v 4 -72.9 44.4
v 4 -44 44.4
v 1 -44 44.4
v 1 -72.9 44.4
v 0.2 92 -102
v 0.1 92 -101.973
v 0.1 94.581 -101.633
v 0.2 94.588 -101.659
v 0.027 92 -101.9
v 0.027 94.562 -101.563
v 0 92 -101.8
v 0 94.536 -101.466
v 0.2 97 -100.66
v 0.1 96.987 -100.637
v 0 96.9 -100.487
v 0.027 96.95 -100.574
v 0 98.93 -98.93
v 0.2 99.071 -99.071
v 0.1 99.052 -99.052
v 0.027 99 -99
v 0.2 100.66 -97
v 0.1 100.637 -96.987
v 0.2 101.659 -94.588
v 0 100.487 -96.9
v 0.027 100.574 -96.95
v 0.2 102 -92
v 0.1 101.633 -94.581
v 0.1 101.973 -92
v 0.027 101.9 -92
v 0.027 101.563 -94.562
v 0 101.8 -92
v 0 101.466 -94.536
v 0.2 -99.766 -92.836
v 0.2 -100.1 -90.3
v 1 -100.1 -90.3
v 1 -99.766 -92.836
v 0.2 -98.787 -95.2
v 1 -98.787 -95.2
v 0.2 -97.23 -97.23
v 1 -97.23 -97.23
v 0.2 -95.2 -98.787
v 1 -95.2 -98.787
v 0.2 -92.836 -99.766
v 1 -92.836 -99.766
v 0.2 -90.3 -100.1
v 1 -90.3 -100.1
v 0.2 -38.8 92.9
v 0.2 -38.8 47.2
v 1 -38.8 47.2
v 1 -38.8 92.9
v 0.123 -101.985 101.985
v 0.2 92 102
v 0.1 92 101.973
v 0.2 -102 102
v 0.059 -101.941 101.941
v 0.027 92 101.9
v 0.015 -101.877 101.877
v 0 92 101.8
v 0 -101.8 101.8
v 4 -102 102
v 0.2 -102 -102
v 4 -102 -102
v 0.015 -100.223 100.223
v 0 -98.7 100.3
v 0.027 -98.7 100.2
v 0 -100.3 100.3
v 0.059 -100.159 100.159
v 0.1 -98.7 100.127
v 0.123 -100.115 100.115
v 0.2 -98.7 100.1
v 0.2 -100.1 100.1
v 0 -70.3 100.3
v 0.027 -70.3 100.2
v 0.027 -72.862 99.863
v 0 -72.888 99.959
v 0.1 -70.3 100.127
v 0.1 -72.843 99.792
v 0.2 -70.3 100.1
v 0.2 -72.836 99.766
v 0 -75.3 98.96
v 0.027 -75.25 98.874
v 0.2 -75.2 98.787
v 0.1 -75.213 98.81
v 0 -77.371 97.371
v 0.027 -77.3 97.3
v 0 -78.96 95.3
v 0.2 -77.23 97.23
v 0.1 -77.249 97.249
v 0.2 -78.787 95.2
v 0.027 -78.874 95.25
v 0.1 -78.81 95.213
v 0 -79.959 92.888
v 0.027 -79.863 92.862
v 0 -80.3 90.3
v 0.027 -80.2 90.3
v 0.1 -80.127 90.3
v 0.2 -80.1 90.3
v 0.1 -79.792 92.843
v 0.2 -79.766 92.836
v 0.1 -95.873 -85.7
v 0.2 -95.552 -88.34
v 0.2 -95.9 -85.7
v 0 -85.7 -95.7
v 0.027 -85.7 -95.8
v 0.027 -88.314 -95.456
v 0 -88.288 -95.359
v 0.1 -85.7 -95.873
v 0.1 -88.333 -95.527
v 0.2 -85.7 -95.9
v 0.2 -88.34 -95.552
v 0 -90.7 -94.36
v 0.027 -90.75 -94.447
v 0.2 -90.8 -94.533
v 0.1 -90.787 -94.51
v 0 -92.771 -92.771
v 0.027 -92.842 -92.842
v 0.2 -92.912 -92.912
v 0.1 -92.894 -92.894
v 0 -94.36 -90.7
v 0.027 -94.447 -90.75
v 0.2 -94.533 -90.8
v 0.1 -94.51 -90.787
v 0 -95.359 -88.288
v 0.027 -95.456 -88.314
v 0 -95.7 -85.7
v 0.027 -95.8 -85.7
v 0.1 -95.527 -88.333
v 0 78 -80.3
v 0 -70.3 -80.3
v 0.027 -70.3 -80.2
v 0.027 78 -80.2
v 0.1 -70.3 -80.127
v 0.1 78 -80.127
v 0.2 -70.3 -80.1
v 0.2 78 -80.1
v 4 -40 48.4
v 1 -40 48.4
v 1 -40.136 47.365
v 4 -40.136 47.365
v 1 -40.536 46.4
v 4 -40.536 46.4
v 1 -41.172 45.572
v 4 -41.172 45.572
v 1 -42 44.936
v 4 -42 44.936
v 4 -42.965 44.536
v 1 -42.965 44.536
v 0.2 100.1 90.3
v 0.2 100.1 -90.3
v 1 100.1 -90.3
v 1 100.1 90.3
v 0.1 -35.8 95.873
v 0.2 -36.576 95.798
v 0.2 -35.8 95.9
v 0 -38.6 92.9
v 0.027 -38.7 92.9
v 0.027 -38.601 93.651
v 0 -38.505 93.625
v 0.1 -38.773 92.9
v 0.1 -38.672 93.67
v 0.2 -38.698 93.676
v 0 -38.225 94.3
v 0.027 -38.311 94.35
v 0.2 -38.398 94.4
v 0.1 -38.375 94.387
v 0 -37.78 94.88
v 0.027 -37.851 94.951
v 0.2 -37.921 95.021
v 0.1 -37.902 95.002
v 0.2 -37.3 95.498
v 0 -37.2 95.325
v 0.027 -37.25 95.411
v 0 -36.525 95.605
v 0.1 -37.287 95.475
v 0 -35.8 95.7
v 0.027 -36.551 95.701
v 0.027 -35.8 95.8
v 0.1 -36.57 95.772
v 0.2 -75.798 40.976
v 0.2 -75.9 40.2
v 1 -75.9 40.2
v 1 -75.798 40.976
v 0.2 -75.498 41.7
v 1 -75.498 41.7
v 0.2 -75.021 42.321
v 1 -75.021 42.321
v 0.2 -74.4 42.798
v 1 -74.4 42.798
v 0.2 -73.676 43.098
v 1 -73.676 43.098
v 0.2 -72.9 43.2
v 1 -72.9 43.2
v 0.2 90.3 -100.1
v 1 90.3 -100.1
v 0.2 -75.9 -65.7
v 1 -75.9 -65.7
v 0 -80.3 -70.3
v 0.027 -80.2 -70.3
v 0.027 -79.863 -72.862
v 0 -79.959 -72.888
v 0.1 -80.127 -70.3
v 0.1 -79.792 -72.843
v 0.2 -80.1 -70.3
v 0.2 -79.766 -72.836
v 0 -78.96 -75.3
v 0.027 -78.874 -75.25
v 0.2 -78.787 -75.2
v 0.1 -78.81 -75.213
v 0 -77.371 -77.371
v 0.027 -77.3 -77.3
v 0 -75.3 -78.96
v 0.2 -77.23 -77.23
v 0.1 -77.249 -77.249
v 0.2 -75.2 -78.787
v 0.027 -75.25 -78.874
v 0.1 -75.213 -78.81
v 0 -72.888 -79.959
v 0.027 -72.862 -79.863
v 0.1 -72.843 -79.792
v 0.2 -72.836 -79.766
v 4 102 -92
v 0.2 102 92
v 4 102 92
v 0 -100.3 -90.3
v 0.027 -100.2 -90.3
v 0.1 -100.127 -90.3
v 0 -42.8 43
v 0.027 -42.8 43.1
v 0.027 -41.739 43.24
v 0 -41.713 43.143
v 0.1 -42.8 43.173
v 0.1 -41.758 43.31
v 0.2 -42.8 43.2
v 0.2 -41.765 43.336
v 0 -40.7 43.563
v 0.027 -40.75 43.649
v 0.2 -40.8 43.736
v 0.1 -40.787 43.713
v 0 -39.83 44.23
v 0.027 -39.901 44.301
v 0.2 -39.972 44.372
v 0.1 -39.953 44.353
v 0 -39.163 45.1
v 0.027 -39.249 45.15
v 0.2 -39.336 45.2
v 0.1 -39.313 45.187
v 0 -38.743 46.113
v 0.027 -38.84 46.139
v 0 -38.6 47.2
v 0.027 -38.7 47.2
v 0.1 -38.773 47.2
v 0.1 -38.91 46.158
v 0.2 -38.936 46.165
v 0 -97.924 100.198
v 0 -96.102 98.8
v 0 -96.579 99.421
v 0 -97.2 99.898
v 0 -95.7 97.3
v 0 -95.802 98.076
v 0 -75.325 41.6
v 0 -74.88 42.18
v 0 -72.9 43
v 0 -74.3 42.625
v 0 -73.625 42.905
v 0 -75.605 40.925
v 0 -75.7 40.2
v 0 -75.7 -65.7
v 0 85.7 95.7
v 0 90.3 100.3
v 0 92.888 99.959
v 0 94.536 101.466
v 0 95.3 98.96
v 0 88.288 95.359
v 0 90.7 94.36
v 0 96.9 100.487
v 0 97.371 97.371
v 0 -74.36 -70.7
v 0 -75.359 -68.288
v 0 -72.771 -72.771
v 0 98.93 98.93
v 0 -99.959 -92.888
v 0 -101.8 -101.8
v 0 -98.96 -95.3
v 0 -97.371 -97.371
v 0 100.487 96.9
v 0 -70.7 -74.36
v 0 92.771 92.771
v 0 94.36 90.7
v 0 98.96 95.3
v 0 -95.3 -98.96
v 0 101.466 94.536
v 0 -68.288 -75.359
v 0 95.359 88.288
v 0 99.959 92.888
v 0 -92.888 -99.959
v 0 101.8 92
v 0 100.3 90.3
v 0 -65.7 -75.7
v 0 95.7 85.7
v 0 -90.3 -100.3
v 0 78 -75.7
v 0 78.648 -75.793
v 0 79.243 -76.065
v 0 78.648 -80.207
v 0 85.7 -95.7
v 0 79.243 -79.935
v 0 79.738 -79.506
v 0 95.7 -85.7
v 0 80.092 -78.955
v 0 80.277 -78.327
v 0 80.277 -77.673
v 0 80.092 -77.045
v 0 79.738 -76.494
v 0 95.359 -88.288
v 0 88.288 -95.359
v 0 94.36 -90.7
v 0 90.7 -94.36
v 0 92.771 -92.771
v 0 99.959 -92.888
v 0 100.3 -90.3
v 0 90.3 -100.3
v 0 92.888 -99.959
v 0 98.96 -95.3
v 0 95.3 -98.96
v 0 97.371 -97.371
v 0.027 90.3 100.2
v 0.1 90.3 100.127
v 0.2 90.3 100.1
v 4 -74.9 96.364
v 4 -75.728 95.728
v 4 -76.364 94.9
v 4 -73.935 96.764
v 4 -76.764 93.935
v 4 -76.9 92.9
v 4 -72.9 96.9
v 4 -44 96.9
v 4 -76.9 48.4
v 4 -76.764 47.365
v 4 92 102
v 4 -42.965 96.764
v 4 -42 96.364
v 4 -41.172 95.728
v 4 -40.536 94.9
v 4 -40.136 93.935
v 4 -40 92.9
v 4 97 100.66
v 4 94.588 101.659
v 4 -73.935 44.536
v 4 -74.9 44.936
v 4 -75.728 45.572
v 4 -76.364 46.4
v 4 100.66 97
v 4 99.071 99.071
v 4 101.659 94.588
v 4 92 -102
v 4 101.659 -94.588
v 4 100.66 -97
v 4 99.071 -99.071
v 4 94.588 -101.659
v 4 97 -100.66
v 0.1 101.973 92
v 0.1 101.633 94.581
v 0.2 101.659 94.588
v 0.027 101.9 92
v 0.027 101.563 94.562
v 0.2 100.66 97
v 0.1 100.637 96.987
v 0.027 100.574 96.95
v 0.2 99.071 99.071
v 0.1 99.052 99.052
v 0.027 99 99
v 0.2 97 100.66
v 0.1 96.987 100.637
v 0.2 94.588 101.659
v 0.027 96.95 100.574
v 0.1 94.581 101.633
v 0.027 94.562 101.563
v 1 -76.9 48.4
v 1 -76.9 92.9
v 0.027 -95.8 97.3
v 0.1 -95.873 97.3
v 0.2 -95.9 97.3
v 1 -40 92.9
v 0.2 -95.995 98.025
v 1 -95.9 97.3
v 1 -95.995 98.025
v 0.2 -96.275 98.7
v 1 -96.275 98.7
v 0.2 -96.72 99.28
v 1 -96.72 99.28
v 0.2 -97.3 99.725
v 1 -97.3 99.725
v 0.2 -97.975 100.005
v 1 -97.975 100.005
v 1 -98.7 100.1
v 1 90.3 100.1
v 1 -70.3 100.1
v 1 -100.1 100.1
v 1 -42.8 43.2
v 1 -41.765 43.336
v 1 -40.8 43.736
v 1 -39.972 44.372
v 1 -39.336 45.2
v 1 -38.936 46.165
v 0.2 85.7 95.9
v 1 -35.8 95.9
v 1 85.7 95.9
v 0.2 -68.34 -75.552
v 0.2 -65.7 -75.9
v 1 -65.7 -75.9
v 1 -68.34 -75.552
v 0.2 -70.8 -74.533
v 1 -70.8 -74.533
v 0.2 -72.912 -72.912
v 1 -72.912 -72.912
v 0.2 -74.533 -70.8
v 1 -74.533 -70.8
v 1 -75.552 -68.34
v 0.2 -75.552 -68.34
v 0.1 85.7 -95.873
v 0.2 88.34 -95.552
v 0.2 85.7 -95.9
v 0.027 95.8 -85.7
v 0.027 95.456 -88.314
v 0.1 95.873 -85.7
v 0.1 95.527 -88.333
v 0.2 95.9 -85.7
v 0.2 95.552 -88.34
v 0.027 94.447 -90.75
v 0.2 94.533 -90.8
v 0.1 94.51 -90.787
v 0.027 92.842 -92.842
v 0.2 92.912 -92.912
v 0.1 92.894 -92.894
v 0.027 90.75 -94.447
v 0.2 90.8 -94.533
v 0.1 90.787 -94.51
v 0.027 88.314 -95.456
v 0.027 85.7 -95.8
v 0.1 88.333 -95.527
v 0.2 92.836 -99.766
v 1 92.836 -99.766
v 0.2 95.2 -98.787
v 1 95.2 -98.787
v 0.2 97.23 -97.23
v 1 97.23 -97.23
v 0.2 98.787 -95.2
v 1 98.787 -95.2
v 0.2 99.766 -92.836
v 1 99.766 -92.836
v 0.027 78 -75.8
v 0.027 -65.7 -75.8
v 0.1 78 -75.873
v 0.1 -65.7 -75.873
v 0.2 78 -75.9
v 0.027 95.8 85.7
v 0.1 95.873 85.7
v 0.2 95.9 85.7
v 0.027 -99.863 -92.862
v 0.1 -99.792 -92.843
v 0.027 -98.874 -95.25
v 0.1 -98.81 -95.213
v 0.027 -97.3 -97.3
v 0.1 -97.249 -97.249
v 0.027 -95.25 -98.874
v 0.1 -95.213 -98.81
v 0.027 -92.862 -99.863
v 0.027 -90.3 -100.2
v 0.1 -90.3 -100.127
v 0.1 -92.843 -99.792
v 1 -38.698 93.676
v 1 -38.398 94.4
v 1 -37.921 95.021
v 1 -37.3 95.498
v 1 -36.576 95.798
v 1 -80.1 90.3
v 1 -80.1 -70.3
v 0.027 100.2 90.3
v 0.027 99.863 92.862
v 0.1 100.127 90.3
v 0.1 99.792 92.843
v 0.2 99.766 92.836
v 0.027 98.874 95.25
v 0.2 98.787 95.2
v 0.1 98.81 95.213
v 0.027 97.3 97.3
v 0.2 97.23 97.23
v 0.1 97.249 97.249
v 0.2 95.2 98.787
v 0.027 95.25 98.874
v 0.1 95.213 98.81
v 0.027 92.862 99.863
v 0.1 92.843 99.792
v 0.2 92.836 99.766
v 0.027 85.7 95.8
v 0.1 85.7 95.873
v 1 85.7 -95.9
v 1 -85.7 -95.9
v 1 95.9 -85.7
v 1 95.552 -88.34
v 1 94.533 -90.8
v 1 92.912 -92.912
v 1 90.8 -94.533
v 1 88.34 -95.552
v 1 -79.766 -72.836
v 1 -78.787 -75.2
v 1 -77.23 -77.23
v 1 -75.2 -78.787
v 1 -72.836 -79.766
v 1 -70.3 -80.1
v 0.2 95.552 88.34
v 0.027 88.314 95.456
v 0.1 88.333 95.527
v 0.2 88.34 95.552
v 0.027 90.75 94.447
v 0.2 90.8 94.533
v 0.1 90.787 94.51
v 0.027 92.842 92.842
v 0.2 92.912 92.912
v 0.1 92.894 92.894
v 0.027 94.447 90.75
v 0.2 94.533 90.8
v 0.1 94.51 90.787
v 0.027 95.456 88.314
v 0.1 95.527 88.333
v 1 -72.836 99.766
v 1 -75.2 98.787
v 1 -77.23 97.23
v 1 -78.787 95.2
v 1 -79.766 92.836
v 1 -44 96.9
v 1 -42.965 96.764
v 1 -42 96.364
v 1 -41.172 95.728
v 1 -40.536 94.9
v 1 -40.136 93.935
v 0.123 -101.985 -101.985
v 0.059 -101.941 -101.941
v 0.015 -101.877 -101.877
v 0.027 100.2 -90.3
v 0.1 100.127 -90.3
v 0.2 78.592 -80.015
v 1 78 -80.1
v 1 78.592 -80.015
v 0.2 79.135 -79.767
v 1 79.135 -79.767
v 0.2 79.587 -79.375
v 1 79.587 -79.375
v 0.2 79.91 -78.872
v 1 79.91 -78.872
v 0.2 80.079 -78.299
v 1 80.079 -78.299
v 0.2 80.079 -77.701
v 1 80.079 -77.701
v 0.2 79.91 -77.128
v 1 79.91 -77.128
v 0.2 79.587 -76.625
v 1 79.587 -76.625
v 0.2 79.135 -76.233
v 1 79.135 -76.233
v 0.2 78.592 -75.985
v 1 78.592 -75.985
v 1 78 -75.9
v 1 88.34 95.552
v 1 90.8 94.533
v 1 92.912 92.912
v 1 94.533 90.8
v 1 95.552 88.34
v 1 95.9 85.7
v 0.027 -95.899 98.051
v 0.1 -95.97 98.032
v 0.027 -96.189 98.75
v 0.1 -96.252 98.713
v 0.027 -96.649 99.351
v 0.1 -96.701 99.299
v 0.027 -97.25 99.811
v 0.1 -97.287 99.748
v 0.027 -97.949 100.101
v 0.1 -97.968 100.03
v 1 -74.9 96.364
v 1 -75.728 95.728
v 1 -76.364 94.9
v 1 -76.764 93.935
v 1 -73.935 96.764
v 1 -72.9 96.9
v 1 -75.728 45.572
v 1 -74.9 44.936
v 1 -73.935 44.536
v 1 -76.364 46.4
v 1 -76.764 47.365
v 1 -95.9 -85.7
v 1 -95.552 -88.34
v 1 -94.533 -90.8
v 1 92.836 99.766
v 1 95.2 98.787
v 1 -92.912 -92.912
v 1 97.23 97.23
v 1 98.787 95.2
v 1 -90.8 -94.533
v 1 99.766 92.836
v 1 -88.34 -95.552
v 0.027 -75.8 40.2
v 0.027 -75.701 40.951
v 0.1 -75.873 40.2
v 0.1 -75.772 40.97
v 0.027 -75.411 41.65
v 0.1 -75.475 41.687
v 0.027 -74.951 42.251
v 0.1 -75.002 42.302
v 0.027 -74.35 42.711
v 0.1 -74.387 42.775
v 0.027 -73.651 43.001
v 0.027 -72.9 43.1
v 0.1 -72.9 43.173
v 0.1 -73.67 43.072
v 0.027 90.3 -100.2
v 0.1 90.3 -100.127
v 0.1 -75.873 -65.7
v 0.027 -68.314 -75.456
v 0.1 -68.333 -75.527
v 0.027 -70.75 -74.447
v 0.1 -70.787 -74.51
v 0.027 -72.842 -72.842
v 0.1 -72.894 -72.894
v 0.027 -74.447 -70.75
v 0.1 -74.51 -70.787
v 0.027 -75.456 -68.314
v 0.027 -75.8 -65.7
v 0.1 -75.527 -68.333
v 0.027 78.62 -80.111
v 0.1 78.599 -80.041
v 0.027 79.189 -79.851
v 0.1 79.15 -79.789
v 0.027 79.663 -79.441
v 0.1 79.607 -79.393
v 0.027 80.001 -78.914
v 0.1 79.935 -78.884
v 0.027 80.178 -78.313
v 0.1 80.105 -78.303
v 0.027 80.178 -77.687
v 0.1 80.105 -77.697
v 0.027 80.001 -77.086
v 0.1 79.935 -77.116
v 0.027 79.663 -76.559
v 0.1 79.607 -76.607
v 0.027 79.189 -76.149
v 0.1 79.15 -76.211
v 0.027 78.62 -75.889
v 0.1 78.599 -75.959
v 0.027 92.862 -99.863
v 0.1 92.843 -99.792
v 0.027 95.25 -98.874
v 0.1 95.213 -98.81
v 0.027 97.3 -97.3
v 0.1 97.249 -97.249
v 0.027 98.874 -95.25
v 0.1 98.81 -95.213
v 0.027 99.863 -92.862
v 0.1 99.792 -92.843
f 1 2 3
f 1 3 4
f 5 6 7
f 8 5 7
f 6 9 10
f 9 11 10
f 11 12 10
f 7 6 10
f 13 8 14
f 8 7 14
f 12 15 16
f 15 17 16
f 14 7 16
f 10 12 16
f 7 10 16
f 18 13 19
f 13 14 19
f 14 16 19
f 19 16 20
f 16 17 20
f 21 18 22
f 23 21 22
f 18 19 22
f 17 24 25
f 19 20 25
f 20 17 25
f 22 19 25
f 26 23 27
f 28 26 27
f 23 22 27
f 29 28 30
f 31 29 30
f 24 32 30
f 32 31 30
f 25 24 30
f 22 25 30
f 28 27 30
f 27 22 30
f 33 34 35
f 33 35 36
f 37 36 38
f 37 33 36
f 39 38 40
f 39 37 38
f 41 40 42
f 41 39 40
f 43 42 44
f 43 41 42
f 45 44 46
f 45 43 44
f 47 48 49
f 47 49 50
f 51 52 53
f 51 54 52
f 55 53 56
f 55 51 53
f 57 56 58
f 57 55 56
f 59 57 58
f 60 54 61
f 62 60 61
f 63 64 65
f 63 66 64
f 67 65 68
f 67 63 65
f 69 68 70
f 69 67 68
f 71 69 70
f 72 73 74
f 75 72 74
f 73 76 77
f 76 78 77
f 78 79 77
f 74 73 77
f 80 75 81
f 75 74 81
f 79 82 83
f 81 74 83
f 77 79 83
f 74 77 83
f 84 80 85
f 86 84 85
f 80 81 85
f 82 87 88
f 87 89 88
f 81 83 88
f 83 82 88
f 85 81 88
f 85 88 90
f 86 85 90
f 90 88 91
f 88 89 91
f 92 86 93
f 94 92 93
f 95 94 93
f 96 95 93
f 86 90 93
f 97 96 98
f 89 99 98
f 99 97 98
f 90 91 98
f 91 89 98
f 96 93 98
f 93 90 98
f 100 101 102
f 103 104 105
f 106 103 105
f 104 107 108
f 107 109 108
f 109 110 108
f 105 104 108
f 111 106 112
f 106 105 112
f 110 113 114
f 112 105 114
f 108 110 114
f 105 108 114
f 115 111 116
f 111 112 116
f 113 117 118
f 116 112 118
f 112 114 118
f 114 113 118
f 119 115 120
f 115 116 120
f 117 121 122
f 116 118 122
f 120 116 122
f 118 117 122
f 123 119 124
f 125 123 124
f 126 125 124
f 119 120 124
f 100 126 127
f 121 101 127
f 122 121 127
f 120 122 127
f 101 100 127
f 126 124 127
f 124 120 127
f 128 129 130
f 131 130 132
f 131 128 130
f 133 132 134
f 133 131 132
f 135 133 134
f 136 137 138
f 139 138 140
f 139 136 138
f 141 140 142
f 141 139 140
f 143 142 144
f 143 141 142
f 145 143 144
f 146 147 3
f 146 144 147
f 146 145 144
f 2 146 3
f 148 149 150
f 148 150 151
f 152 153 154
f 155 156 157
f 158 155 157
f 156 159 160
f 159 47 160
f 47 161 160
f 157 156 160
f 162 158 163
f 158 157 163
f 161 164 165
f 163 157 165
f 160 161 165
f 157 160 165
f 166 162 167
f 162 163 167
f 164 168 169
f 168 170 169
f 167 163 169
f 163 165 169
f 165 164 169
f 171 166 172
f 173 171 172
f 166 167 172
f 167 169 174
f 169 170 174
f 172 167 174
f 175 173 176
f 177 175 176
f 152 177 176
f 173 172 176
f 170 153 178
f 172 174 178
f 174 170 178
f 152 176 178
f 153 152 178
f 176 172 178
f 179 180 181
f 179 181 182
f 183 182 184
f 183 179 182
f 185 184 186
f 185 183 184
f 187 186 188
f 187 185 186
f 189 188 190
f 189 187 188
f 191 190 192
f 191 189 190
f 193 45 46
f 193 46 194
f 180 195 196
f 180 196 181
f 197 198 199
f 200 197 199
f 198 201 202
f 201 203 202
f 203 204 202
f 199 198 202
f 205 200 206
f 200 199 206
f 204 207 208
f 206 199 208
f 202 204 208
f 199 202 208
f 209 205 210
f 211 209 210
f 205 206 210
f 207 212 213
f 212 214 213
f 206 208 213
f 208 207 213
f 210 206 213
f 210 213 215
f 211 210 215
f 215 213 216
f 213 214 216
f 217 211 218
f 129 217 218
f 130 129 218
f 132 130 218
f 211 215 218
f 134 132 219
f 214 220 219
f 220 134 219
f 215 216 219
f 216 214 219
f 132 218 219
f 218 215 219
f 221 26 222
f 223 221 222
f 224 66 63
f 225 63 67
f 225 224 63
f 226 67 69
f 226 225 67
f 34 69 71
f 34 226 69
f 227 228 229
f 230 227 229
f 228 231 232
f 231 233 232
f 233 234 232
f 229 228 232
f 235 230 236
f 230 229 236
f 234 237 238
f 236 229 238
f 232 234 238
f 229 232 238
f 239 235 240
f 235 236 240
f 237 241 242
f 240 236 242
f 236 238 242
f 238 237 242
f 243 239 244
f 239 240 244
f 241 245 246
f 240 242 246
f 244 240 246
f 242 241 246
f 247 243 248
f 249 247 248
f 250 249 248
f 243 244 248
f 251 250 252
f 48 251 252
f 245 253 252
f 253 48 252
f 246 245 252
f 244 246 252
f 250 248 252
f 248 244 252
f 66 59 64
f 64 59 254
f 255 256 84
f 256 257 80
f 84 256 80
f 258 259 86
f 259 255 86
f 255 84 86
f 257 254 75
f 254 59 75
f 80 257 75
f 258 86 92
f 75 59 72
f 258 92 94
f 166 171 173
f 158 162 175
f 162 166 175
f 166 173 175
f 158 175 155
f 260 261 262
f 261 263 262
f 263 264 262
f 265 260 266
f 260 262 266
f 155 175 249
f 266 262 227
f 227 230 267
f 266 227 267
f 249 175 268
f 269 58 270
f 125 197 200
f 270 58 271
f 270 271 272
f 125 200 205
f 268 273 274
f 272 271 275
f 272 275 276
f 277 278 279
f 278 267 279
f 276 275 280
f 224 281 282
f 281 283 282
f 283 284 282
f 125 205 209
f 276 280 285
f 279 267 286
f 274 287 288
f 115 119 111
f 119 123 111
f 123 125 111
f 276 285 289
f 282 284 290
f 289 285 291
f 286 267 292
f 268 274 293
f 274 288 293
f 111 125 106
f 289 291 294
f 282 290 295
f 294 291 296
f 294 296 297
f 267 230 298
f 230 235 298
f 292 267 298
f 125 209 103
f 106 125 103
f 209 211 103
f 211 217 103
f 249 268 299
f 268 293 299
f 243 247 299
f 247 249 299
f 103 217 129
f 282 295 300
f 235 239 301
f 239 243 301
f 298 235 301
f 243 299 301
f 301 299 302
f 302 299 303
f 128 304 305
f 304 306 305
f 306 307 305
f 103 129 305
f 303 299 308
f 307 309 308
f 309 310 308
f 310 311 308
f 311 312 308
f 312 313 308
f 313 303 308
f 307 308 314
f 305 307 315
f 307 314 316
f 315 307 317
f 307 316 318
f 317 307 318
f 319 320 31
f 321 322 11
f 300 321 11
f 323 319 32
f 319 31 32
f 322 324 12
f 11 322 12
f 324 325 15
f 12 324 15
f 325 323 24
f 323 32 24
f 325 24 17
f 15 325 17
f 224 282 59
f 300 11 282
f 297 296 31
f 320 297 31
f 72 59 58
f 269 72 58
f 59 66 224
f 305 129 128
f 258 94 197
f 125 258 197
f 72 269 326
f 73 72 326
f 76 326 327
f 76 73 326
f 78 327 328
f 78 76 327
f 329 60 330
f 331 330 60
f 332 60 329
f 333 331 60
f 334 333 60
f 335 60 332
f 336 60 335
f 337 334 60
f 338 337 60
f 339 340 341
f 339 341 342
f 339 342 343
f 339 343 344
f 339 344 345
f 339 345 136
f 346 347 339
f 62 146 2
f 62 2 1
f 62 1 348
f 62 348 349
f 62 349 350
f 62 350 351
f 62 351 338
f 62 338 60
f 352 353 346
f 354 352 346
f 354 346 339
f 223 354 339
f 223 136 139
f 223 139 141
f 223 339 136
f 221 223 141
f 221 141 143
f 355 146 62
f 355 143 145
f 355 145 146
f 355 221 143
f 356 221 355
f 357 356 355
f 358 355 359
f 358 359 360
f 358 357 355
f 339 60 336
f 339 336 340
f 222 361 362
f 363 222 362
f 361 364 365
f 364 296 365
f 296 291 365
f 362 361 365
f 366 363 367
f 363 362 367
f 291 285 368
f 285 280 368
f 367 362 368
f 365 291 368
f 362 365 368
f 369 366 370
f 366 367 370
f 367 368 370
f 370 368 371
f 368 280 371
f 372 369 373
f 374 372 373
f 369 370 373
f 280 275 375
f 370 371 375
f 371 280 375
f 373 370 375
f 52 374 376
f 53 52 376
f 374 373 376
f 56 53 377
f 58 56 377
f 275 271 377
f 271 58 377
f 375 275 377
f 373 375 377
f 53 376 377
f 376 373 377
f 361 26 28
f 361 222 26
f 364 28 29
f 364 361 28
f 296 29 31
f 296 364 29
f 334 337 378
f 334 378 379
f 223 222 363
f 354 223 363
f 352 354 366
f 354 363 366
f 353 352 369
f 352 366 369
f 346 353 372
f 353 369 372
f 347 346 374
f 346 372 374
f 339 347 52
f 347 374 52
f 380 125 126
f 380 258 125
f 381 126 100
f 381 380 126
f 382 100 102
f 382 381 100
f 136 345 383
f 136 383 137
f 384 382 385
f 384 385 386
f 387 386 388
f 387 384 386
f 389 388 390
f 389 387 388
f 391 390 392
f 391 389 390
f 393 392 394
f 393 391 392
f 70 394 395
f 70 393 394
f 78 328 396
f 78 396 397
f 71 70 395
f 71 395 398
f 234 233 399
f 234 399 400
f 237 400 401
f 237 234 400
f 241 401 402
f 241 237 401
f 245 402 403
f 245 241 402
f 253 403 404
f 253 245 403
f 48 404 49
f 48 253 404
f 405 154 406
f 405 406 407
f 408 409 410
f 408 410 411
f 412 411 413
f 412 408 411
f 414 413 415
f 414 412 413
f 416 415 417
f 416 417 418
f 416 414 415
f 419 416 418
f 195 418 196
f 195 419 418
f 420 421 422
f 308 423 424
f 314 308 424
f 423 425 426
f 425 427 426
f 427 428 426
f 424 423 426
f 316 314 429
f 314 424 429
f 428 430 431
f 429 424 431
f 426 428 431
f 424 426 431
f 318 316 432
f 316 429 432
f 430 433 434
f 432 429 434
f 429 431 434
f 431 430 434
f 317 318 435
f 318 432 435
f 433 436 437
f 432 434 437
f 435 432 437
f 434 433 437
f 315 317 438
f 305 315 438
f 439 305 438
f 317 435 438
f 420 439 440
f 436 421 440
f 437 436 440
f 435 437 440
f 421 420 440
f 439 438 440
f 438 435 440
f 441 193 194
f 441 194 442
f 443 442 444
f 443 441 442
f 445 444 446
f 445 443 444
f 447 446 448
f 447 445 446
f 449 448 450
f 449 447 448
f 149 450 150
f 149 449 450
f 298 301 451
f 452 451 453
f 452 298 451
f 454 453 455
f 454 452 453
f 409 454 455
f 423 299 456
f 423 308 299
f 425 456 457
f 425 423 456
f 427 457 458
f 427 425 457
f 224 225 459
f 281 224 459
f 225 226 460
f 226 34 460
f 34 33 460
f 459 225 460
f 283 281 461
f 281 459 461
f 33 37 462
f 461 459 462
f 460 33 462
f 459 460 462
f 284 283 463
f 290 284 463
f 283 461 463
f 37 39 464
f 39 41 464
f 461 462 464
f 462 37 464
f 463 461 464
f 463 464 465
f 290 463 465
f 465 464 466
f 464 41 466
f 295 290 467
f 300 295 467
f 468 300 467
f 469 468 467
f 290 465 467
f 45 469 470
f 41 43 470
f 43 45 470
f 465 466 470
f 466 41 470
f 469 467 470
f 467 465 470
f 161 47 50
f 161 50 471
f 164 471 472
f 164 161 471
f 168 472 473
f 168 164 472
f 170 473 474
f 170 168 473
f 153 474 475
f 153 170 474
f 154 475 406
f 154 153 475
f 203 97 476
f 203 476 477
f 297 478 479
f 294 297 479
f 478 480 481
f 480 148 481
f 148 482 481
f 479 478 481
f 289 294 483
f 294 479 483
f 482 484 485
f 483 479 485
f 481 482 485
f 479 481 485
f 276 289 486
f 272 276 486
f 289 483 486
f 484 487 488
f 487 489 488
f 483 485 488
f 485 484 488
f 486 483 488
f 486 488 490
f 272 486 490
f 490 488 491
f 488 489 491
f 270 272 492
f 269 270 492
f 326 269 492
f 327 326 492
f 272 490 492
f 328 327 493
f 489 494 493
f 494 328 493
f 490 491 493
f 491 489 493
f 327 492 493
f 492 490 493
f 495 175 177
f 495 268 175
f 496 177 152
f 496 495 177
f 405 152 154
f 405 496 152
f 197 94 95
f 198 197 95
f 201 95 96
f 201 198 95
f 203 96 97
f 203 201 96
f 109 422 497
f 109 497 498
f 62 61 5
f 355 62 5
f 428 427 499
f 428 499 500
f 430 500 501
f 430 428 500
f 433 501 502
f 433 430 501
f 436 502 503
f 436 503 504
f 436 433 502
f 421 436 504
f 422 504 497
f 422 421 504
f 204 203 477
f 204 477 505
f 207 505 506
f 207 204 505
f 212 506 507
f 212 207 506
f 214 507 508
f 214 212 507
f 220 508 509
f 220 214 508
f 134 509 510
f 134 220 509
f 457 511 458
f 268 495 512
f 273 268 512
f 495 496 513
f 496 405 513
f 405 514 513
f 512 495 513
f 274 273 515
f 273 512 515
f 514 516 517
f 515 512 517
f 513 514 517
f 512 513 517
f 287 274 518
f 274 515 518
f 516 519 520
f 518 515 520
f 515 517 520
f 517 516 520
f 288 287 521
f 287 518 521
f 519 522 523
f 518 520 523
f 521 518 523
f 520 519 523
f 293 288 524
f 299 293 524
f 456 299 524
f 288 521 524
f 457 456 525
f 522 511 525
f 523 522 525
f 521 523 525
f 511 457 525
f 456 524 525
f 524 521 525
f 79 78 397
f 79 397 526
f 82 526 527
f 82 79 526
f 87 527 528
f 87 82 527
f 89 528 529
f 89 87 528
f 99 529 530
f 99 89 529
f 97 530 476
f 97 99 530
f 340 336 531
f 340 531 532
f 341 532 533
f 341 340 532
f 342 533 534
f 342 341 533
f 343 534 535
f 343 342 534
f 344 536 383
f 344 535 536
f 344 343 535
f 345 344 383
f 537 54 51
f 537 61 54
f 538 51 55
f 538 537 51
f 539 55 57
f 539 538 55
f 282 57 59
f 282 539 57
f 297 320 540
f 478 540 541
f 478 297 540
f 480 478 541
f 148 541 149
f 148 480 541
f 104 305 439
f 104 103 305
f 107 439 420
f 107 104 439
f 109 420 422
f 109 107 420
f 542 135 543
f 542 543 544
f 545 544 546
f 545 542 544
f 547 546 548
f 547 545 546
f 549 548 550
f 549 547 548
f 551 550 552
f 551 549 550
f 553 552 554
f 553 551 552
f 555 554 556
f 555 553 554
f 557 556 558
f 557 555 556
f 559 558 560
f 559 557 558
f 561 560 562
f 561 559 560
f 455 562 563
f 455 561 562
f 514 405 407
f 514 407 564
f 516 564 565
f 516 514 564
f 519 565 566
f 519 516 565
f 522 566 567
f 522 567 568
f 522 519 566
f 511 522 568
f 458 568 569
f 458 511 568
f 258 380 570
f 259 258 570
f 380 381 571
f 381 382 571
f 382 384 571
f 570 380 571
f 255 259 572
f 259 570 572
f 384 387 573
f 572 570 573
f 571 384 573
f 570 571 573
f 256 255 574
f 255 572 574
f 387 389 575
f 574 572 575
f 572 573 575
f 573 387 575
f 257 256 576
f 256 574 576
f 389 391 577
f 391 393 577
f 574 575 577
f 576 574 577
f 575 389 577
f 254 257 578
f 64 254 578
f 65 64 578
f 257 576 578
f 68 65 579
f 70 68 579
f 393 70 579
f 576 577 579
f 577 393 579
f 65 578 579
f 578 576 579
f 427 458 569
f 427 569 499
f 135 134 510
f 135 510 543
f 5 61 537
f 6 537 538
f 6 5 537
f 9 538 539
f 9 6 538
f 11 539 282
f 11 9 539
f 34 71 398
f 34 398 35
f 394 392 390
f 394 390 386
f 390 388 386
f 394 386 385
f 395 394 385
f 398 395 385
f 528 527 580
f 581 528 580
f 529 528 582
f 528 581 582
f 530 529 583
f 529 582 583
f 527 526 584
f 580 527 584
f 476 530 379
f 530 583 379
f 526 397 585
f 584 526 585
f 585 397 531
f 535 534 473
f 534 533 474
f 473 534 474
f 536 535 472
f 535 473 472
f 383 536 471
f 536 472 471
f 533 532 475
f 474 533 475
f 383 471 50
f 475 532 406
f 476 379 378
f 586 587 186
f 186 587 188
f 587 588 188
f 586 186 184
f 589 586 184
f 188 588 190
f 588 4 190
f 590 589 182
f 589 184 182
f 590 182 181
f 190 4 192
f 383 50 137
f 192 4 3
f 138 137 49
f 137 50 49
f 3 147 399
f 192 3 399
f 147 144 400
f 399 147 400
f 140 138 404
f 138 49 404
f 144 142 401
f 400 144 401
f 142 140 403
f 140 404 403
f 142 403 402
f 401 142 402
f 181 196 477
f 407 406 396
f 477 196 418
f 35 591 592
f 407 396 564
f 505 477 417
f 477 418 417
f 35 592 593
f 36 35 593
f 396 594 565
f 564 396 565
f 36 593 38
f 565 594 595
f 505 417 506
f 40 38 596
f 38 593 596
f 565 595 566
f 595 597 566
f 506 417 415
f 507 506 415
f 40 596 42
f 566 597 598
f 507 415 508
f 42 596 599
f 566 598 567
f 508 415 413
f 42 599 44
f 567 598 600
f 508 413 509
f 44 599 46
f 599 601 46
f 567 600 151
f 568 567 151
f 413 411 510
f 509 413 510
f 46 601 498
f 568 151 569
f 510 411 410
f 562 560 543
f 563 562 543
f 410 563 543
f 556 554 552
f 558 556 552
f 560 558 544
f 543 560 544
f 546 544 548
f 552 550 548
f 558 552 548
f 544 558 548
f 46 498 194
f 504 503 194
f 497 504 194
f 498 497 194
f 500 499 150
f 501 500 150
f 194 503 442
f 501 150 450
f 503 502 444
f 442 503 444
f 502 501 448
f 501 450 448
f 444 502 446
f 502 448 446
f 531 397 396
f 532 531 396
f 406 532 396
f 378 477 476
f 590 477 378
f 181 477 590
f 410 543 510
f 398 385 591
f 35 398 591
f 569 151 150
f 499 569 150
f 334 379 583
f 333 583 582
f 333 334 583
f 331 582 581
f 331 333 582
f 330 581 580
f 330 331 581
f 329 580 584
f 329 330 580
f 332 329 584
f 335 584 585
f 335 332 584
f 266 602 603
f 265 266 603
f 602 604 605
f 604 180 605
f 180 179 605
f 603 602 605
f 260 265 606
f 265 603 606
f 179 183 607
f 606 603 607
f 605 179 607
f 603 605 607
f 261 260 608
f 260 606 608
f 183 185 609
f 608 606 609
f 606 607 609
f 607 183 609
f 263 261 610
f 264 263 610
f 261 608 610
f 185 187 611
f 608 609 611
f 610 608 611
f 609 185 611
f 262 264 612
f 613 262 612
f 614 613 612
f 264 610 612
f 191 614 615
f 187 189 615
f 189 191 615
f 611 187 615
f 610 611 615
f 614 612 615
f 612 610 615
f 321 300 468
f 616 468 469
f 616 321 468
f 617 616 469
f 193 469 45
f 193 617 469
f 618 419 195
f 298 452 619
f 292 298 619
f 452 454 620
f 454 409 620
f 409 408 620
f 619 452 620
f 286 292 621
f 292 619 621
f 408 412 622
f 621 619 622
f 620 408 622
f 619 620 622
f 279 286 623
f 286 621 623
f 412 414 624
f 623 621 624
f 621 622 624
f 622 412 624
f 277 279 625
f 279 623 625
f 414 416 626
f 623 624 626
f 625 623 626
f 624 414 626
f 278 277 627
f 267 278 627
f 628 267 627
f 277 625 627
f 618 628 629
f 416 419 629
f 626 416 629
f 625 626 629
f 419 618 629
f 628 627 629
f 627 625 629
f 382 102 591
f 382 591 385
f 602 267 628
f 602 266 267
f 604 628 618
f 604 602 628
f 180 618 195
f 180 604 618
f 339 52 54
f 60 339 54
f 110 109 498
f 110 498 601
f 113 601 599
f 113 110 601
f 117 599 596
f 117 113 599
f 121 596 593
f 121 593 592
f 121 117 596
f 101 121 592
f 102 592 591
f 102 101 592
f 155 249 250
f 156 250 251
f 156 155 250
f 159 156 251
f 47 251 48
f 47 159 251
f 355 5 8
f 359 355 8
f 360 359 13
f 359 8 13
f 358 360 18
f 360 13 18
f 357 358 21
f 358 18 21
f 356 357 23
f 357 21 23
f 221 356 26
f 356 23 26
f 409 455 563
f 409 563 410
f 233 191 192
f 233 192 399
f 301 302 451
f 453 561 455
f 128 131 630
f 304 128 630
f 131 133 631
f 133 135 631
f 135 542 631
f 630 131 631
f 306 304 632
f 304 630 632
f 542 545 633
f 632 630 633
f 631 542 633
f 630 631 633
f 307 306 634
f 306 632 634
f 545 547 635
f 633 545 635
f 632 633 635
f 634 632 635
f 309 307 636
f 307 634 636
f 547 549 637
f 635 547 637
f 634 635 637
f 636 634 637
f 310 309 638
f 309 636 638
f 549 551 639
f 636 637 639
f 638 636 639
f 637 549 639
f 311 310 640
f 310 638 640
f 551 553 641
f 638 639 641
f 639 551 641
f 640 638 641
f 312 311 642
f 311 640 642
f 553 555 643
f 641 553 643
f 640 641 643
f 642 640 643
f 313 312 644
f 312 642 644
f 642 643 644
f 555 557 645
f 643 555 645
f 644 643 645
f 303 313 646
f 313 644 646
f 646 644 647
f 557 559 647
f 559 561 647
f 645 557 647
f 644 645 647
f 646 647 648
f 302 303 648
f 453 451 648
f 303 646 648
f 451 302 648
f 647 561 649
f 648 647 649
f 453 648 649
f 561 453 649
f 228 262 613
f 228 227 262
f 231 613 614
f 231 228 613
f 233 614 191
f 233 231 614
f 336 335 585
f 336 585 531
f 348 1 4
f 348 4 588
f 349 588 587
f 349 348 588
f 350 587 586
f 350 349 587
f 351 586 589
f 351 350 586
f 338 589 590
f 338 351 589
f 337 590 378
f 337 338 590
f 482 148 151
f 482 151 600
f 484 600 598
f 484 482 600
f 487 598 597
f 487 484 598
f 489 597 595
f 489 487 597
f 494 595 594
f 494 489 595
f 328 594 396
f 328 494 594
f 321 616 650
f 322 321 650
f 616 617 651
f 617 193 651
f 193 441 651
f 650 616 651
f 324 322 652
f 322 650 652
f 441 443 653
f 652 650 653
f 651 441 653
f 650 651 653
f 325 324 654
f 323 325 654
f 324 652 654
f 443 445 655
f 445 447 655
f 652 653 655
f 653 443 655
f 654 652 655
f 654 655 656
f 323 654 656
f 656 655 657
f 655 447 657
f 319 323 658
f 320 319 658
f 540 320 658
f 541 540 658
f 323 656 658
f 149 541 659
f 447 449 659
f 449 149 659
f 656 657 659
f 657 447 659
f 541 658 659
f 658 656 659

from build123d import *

# Parameters (mm, degrees)
BOSS_EXTRUDE1_DEPTH = 4
CUT_EXTRUDE3_START  = -4
CUT_EXTRUDE3_DEPTH  = 1
FILLET1_R           = 0.2
CUT_EXTRUDE4_REACH  = 146.305


with BuildPart() as part:
    # Sketch1 → Boss-Extrude1 (new body)
    with BuildSketch(Plane(origin=(0, 0, 0), x_dir=(0, 0, -1), z_dir=(1, 0, 0))):
        with BuildLine():
            Line((-102, -102), (102, -102))
            Line((102, -102), (102, 92))
            ThreePointArc((102, 92), (99.071067812, 99.071067812), (92, 102))
            Line((92, 102), (-92, 102))
            ThreePointArc((-92, 102), (-99.071067812, 99.071067812), (-102, 92))
            Line((-102, 92), (-102, -102))
        make_face()
    extrude(amount=BOSS_EXTRUDE1_DEPTH)

    # Sketch2 → Cut-Extrude3 (cut)
    with BuildSketch(Plane(origin=(4, 0, 0), x_dir=(0, 0, -1), z_dir=(1, 0, 0)).offset(CUT_EXTRUDE3_START)):
        with BuildLine():
            Line((-100.1, 90.3), (-100.1, -70.3))
            ThreePointArc((-100.1, -70.3), (-97.229646456, -77.229646456), (-90.3, -80.1))
            Line((-90.3, -80.1), (70.3, -80.1))
            ThreePointArc((70.3, -80.1), (77.229646456, -77.229646456), (80.1, -70.3))
            Line((80.1, -70.3), (80.1, 78))
            ThreePointArc((80.1, 78), (78, 80.1), (75.9, 78))
            Line((75.9, 78), (75.9, -65.7))
            ThreePointArc((75.9, -65.7), (72.912489168, -72.912489168), (65.7, -75.9))
            Line((65.7, -75.9), (-40.2, -75.9))
            ThreePointArc((-40.2, -75.9), (-42.321320344, -75.021320344), (-43.2, -72.9))
            Line((-43.2, -72.9), (-43.2, -42.8))
            ThreePointArc((-43.2, -42.8), (-44.371572875, -39.971572875), (-47.2, -38.8))
            Line((-47.2, -38.8), (-92.9, -38.8))
            ThreePointArc((-92.9, -38.8), (-95.021320344, -37.921320344), (-95.9, -35.8))
            Line((-95.9, -35.8), (-95.9, 85.7))
            ThreePointArc((-95.9, 85.7), (-92.912489168, 92.912489168), (-85.7, 95.9))
            Line((-85.7, 95.9), (85.7, 95.9))
            ThreePointArc((85.7, 95.9), (92.912489168, 92.912489168), (95.9, 85.7))
            Line((95.9, 85.7), (95.9, -85.7))
            ThreePointArc((95.9, -85.7), (92.912489168, -92.912489168), (85.7, -95.9))
            Line((85.7, -95.9), (-97.3, -95.9))
            ThreePointArc((-97.3, -95.9), (-99.279898987, -96.720101013), (-100.1, -98.7))
            Line((-100.1, -98.7), (-100.1, -100.1))
            Line((-100.1, -100.1), (90.3, -100.1))
            ThreePointArc((90.3, -100.1), (97.229646456, -97.229646456), (100.1, -90.3))
            Line((100.1, -90.3), (100.1, 90.3))
            ThreePointArc((100.1, 90.3), (97.229646456, 97.229646456), (90.3, 100.1))
            Line((90.3, 100.1), (-90.3, 100.1))
            ThreePointArc((-90.3, 100.1), (-97.229646456, 97.229646456), (-100.1, 90.3))
        make_face()
        with BuildLine():
            Line((-90.9, -75.9), (-48.4, -75.9))
            ThreePointArc((-48.4, -75.9), (-46.278679656, -75.021320344), (-45.4, -72.9))
            Line((-45.4, -72.9), (-45.4, -65.9))
            Line((-45.4, -65.9), (-46.4, -65.9))
            Line((-46.4, -65.9), (-46.4, -64.4))
            Line((-46.4, -64.4), (-45.4, -64.4))
            Line((-45.4, -64.4), (-45.4, -62.5))
            Line((-45.4, -62.5), (-46.4, -62.5))
            Line((-46.4, -62.5), (-46.4, -61))
            Line((-46.4, -61), (-45.4, -61))
            Line((-45.4, -61), (-45.4, -45))
            ThreePointArc((-45.4, -45), (-46.571572875, -42.171572875), (-49.4, -41))
            Line((-49.4, -41), (-92.9, -41))
            ThreePointArc((-92.9, -41), (-95.021320344, -41.878679656), (-95.9, -44))
            Line((-95.9, -44), (-95.9, -61))
            Line((-95.9, -61), (-94.9, -61))
            Line((-94.9, -61), (-94.9, -62.5))
            Line((-94.9, -62.5), (-95.9, -62.5))
            Line((-95.9, -62.5), (-95.9, -64.4))
            Line((-95.9, -64.4), (-94.9, -64.4))
            Line((-94.9, -64.4), (-94.9, -65.9))
            Line((-94.9, -65.9), (-95.9, -65.9))
            Line((-95.9, -65.9), (-95.9, -70.9))
            ThreePointArc((-95.9, -70.9), (-94.435533906, -74.435533906), (-90.9, -75.9))
        make_face(mode=Mode.SUBTRACT)
    extrude(amount=CUT_EXTRUDE3_DEPTH, mode=Mode.SUBTRACT)

    # Fillet1
    fillet1_edges = [part.edges().sort_by_distance(p)[0] for p in [
        (0, -72.912489168, -72.912489168),
        (0, -75.021320344, 42.321320344),
        (0, -37.921320344, 95.021320344),
        (0, 92.912489168, 92.912489168),
        (0, 92.912489168, -92.912489168),
        (0, -92.912489168, -92.912489168),
        (0, -96.720101013, 99.279898987),
        (0, -95.9, 5.8),
        (0, 0, -95.9),
        (0, 95.9, 0),
        (0, 24.95, 95.9),
        (0, -38.8, 70.05),
        (0, -39.971572875, 44.371572875),
        (0, -57.85, 43.2),
        (0, -75.9, -12.75),
        (0, 6.15, -75.9),
        (0, 80.1, -78),
        (0, 3.85, -80.1),
        (0, -77.229646456, -77.229646456),
        (0, -80.1, 10),
        (0, -77.229646456, 97.229646456),
        (0, 10, 100.1),
        (0, 97.229646456, 97.229646456),
        (0, 100.1, 0),
        (0, 97.229646456, -97.229646456),
        (0, -102, 0),
        (0, 0, -100.1),
        (0, -97.229646456, -97.229646456),
        (0, -100.1, 4.9),
        (0, -99.4, 100.1),
        (0, -65.15, 94.9),
        (0, -65.9, 95.4),
        (0, -68.4, 95.9),
        (0, -74.435533906, 94.435533906),
        (0, -75.9, 69.65),
        (0, -75.021320344, 46.278679656),
        (0, -69.4, 45.4),
        (0, -5, 102),
        (0, -65.9, 45.9),
        (0, -65.15, 46.4),
        (0, -64.4, 45.9),
        (0, -63.45, 45.4),
        (0, -62.5, 45.9),
        (0, -61.75, 46.4),
        (0, -61, 45.9),
        (0, -53, 45.4),
        (0, -42.171572875, 46.571572875),
        (0, -41, 71.15),
        (0, 99.071067812, 99.071067812),
        (0, -41.878679656, 95.021320344),
        (0, -52.5, 95.9),
        (0, -61, 95.4),
        (0, -61.75, 94.9),
        (0, -62.5, 95.4),
        (0, -63.45, 95.9),
        (0, -64.4, 95.4),
        (0, 102, 0),
        (0, 99.071067812, -99.071067812),
        (0, -5, -102),
    ]]
    fillet(fillet1_edges, radius=FILLET1_R)

    # Sketch4 → Cut-Extrude4 (cut, up to next)
    with BuildSketch(Plane(origin=(4, 0, 0), x_dir=(0, 0, -1), z_dir=(1, 0, 0)), mode=Mode.PRIVATE) as cut_extrude4_sk1:
        with BuildLine():
            Line((-92.9, -40), (-48.4, -40))
            ThreePointArc((-48.4, -40), (-45.571572875, -41.171572875), (-44.4, -44))
            Line((-44.4, -44), (-44.4, -72.9))
            ThreePointArc((-44.4, -72.9), (-45.571572875, -75.728427125), (-48.4, -76.9))
            Line((-48.4, -76.9), (-92.9, -76.9))
            ThreePointArc((-92.9, -76.9), (-95.728427125, -75.728427125), (-96.9, -72.9))
            Line((-96.9, -72.9), (-96.9, -44))
            ThreePointArc((-96.9, -44), (-95.728427125, -41.171572875), (-92.9, -40))
        make_face()
    cut_extrude4_tool1 = extrude(cut_extrude4_sk1.sketch, amount=-CUT_EXTRUDE4_REACH, mode=Mode.PRIVATE) & part.part
    add(cut_extrude4_tool1.solids().sort_by_distance((4, -58.45, 70.65))[0], mode=Mode.SUBTRACT)


solid = part.part
